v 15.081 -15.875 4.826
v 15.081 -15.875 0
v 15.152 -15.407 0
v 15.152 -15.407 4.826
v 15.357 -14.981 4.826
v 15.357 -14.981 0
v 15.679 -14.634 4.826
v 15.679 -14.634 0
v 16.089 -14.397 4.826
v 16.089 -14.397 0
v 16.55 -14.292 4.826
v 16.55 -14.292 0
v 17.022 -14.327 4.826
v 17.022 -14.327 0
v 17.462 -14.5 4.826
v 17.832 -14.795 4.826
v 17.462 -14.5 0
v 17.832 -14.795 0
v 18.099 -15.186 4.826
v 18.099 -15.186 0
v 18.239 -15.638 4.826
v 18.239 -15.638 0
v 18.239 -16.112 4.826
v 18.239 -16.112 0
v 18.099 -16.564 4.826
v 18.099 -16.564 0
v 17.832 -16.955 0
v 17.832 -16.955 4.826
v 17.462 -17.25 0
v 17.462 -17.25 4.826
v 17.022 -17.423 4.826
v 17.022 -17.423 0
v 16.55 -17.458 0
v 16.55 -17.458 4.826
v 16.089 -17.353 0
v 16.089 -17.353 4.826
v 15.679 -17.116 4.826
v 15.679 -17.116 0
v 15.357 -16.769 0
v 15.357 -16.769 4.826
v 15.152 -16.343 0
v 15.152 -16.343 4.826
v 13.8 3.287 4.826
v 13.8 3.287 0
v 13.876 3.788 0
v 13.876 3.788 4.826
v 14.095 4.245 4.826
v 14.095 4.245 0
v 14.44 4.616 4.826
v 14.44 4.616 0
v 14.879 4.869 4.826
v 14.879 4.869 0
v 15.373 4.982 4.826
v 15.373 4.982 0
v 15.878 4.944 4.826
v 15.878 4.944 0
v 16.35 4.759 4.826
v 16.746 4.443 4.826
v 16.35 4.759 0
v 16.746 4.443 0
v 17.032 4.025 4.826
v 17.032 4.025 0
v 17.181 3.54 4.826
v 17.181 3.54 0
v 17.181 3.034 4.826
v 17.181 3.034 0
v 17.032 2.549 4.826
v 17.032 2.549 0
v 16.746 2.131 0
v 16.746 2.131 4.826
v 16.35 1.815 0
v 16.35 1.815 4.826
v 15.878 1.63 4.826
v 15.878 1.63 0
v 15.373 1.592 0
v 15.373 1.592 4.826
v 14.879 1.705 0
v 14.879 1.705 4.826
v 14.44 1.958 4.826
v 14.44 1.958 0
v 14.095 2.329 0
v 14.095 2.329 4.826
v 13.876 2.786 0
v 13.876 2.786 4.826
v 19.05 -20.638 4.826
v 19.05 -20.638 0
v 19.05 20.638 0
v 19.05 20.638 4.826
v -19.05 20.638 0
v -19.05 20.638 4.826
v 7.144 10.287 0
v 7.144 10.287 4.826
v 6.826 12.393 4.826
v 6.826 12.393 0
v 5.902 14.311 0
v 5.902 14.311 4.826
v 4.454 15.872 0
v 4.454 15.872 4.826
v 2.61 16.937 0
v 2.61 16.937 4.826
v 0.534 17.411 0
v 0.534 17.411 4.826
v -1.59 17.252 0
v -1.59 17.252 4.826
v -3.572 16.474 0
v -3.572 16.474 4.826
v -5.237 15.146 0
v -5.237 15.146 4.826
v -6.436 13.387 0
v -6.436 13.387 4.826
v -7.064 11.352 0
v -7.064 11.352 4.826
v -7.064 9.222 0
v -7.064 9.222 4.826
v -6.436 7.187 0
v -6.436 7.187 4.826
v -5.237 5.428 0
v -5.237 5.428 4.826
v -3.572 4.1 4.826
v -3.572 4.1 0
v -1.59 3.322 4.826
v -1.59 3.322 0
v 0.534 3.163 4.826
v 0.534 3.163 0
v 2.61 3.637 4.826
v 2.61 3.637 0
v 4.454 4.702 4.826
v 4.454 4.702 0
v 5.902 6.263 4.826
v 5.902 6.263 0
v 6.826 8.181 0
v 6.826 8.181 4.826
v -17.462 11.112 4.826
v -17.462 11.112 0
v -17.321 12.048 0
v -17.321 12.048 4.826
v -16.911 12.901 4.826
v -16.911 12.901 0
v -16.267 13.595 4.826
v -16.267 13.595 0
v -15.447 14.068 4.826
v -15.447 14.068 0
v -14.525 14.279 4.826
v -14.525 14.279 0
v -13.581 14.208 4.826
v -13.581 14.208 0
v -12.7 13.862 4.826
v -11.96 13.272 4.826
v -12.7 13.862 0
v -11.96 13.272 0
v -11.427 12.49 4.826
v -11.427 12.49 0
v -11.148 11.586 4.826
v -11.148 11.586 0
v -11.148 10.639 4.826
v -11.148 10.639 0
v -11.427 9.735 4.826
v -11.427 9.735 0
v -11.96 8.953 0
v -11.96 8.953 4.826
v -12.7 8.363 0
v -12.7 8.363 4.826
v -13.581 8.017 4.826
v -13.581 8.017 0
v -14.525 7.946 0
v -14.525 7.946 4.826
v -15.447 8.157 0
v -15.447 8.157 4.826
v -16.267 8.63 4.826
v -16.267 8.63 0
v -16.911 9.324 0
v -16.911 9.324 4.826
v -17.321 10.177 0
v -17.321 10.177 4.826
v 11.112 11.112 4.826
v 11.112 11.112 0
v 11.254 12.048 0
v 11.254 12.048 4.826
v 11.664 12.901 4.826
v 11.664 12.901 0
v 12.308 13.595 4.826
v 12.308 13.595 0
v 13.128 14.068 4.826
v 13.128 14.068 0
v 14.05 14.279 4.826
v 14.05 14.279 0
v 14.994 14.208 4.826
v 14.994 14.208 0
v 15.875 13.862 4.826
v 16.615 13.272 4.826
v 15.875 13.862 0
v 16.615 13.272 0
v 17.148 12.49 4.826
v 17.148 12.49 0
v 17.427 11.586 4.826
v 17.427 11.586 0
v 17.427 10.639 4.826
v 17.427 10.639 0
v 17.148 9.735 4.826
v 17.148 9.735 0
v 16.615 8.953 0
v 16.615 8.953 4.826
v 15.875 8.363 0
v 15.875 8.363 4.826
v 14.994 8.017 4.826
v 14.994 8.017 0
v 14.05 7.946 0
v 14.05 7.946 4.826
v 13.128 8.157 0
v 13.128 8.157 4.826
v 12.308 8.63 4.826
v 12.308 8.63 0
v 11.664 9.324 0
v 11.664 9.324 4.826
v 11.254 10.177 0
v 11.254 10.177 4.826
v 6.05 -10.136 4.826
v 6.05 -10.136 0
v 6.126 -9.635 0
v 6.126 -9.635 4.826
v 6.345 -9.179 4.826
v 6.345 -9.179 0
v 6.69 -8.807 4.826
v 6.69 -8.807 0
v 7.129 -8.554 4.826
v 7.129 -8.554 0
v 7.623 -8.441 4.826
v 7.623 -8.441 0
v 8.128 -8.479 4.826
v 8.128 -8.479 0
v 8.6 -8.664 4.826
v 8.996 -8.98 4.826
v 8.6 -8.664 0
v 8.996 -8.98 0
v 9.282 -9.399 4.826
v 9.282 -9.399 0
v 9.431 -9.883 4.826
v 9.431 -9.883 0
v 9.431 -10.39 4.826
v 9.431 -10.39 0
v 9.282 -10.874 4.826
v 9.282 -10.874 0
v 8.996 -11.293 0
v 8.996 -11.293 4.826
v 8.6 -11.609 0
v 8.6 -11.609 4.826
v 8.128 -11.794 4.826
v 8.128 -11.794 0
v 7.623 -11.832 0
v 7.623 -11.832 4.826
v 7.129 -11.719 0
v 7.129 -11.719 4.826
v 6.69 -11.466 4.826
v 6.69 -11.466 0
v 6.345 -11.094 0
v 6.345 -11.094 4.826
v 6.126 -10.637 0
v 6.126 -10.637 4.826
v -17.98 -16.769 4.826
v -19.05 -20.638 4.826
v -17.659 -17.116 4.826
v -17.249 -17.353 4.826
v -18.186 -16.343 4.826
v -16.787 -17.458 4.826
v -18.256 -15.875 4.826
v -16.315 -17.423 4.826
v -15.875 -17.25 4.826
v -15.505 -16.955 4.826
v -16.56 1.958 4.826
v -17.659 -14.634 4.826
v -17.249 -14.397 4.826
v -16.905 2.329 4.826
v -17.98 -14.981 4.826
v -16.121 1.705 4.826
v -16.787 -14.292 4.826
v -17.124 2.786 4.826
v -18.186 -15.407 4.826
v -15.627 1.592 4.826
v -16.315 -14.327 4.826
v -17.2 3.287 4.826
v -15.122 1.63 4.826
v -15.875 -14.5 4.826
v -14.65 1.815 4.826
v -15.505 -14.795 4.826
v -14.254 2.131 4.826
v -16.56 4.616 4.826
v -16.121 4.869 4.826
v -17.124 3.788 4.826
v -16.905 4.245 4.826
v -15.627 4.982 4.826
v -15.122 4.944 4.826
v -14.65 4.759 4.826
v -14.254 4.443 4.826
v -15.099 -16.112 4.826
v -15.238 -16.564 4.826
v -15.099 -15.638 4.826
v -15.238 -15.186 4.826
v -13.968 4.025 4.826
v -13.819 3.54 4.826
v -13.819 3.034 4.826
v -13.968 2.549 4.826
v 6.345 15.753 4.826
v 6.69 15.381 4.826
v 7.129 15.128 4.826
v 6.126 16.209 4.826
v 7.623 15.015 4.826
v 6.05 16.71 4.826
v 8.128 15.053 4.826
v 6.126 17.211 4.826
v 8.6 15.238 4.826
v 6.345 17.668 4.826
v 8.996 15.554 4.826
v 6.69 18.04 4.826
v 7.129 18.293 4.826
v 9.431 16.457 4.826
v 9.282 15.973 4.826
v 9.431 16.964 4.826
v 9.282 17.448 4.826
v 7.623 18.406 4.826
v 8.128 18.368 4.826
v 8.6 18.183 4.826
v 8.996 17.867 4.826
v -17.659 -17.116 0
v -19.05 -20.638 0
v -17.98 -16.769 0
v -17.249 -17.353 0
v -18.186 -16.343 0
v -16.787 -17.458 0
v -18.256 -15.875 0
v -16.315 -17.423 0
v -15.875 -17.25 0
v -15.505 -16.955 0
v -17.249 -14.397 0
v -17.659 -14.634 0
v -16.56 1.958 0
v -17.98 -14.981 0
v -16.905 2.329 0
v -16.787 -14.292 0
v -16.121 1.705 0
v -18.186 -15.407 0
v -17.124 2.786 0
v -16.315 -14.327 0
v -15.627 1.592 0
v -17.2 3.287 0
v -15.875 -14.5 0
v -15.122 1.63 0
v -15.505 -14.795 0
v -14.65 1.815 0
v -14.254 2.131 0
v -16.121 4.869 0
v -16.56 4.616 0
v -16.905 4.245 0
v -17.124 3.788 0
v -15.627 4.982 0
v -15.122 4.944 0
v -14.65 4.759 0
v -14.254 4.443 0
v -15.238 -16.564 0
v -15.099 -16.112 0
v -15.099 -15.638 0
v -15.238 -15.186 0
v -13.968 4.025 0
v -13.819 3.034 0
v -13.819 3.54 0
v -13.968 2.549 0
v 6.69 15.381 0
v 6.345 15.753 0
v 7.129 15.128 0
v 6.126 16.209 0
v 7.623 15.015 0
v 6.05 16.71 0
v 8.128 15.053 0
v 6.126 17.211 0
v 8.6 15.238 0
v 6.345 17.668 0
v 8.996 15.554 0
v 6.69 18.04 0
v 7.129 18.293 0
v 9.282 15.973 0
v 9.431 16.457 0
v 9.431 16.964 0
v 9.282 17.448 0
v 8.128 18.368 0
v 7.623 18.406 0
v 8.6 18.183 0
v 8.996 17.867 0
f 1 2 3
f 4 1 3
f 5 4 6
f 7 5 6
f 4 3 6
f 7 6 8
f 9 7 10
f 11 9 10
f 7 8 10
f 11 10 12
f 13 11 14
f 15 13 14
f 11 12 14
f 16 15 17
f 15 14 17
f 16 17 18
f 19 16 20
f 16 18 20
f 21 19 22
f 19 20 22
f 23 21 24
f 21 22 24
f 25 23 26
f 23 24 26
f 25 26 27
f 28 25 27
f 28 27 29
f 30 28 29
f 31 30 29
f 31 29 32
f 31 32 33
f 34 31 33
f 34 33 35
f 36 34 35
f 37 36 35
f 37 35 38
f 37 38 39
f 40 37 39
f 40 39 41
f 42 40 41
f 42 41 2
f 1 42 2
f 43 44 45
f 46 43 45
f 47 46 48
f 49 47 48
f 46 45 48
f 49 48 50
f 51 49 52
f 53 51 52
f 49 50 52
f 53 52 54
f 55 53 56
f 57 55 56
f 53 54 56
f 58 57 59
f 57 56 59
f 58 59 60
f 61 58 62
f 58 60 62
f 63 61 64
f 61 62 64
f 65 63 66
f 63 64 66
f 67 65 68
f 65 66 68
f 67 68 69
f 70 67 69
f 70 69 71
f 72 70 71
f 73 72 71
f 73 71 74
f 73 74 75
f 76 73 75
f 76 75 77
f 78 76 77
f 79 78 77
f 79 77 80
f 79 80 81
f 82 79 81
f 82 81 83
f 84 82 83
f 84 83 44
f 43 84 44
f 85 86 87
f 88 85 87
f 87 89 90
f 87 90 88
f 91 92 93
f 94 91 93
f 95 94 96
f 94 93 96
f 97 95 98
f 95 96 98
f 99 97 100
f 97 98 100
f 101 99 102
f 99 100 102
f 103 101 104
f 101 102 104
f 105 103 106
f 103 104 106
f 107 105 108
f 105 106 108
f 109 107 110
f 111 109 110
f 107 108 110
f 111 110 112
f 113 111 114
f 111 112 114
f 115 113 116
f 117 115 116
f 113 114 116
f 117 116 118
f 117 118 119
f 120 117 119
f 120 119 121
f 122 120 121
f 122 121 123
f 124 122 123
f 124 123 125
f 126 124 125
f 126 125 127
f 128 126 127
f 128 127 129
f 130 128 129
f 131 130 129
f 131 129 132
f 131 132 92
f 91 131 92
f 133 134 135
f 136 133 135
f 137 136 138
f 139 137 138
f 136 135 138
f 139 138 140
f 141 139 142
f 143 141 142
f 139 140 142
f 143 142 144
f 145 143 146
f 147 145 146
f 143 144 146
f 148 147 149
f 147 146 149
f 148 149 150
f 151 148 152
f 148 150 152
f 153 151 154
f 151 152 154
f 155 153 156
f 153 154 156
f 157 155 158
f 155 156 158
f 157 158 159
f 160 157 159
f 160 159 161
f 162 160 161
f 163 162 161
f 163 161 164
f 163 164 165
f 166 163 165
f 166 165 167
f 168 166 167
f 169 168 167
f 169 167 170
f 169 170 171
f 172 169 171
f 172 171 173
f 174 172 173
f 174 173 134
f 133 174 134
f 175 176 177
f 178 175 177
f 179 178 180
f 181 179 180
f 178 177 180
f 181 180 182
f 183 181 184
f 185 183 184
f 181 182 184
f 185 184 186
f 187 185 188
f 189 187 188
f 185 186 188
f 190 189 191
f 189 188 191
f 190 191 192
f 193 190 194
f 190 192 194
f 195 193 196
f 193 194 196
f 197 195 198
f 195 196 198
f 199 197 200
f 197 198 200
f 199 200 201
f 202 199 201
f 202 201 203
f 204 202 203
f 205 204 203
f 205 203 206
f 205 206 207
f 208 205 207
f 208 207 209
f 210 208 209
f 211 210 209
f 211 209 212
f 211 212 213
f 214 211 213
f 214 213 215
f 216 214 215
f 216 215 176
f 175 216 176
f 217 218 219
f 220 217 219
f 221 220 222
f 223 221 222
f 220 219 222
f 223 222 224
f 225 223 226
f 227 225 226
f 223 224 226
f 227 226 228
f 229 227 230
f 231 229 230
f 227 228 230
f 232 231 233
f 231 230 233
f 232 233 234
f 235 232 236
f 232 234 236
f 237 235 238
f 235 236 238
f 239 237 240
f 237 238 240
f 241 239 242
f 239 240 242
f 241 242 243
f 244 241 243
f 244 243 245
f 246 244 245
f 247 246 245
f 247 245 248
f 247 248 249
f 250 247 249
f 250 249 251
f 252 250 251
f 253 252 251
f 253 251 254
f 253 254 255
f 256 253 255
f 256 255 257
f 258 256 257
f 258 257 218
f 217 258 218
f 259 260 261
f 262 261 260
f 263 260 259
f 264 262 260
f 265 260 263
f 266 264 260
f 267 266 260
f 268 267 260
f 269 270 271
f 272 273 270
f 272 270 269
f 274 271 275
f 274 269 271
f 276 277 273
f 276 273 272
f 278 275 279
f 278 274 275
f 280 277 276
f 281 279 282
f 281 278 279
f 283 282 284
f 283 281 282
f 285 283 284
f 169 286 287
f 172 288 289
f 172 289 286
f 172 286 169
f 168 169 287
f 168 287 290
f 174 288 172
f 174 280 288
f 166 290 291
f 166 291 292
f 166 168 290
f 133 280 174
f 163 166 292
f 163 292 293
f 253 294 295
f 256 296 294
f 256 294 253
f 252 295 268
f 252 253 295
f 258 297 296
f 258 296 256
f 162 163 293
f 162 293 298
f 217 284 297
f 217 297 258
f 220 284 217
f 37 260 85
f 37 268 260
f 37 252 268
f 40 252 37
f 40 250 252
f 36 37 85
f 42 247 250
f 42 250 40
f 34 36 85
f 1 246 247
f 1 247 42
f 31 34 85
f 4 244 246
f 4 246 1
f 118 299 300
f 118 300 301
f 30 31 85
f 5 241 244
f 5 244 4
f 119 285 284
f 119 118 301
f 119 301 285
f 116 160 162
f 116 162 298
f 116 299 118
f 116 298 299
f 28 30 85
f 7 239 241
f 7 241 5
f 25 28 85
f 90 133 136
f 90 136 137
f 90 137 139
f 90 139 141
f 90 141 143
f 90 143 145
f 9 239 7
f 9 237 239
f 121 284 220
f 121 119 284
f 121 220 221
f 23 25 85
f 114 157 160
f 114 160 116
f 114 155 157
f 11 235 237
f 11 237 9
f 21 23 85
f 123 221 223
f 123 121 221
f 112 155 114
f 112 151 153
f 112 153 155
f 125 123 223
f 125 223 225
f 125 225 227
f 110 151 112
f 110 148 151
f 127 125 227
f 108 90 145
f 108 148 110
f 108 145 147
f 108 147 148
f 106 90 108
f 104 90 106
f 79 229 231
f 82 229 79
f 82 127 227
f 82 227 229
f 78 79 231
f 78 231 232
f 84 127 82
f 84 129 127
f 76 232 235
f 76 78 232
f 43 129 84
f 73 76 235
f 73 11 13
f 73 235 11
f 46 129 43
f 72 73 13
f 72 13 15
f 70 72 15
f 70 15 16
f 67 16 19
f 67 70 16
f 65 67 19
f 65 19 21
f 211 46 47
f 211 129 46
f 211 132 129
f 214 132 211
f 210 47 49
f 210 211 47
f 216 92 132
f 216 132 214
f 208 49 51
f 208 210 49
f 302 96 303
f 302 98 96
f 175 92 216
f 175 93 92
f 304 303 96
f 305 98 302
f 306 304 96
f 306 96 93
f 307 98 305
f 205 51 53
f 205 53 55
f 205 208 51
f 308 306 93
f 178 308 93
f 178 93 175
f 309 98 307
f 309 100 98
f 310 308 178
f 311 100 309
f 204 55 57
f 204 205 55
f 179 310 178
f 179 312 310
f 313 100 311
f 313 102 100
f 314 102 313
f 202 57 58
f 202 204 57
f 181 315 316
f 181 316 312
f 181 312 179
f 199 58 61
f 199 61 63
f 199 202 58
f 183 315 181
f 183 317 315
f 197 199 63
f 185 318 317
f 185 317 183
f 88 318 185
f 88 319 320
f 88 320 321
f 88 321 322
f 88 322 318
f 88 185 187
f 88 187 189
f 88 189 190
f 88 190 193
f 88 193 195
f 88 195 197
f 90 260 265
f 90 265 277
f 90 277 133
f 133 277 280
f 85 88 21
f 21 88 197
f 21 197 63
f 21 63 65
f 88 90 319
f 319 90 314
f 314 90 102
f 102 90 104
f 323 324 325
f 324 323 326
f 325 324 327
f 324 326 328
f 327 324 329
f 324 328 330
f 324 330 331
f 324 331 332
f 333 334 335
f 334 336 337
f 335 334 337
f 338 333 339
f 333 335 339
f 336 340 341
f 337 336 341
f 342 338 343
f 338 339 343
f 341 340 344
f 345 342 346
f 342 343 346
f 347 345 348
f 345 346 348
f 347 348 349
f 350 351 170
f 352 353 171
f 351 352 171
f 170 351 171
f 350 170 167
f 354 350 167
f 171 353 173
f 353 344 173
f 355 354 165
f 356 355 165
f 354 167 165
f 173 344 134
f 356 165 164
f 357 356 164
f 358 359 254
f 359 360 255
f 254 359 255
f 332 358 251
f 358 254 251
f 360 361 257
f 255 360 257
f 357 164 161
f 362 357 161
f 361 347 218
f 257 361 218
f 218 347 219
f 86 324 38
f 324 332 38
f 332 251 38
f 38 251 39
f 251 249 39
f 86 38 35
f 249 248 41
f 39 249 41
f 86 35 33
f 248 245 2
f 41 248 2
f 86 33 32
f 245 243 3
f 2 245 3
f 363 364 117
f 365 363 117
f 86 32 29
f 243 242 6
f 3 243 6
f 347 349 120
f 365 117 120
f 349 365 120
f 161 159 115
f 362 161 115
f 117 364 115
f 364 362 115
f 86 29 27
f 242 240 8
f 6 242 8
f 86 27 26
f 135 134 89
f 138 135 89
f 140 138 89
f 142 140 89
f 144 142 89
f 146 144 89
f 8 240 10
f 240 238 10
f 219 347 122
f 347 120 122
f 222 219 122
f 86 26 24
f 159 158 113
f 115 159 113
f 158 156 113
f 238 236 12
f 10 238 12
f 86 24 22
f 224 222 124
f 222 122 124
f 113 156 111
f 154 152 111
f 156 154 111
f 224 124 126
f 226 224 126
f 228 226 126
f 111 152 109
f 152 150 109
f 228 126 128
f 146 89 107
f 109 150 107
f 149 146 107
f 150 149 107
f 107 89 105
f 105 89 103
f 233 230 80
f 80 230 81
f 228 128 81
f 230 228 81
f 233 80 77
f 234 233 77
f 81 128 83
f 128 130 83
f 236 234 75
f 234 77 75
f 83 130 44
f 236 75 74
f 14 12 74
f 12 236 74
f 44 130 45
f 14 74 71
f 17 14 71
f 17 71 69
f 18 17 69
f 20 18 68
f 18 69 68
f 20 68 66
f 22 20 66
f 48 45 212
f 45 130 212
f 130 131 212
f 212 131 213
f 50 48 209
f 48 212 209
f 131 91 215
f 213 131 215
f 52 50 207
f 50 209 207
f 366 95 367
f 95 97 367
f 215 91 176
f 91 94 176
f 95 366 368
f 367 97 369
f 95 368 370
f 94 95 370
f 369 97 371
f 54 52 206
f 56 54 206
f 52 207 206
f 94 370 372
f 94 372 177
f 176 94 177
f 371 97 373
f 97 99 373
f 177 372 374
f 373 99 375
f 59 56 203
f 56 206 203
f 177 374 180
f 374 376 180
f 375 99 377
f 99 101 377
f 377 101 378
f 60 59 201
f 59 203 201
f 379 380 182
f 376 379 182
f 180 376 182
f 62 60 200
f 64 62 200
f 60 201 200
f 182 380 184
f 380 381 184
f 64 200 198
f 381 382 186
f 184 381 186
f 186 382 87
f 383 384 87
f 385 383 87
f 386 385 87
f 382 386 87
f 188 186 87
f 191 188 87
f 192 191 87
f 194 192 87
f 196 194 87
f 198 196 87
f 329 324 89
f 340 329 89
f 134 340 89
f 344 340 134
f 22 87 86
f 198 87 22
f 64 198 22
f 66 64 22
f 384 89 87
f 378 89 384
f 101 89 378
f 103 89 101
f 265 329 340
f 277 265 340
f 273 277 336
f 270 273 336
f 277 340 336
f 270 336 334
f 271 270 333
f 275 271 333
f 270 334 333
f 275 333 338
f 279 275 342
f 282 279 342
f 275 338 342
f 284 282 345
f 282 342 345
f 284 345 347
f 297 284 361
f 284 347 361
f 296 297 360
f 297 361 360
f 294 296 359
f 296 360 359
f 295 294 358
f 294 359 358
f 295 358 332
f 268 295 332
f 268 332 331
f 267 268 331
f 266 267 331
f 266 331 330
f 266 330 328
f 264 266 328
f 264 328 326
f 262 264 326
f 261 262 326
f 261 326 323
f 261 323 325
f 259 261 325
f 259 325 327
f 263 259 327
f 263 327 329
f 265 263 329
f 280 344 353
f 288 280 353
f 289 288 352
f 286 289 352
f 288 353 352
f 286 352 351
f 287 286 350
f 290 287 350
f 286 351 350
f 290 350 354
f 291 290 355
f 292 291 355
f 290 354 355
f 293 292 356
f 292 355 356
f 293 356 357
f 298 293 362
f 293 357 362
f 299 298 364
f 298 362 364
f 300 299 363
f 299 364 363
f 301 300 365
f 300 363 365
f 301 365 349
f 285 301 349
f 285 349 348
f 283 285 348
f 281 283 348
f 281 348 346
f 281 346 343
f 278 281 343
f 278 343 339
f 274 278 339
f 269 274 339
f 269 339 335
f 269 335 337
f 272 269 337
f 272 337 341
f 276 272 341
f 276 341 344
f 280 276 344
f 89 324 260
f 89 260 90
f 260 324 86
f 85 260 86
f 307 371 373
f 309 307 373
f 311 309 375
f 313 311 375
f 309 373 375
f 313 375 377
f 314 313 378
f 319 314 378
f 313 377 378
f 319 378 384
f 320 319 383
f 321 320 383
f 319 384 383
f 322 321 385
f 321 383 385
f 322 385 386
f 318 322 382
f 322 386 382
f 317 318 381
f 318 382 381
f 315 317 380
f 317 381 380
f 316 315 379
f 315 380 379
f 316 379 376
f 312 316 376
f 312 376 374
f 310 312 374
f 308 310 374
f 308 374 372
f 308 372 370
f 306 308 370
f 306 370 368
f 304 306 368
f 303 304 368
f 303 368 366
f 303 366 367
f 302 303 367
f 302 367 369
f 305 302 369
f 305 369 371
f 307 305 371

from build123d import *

# Parameters (mm, degrees)
SKETCH1_W                           = 38.1
SKETCH1_H                           = 41.275
BOSS_EXTRUDE1_DEPTH                 = 4.826
SKETCH2_R                           = 7.14375
CUT_EXTRUDE1_DEPTH                  = 29.497353952
F_3_4_3_4_DIAMETER_HOLE1_D          = 3.4
F_1_4_0_25_DIAMETER_HOLE1_D         = 6.35
F_1_8_0_125_CLEARANCE_DOWEL_HOLE1_D = 3.175


with BuildPart() as part:
    # Sketch1 → Boss-Extrude1 (new body)
    with BuildSketch(Plane.XY):
        Rectangle(SKETCH1_W, SKETCH1_H)
    extrude(amount=BOSS_EXTRUDE1_DEPTH)

    # Sketch2 → Cut-Extrude1 (cut, through all)
    with BuildSketch(Plane.XY.offset(4.826)):
        with Locations((0, 10.287)):
            Circle(SKETCH2_R)
    extrude(amount=-CUT_EXTRUDE1_DEPTH, mode=Mode.SUBTRACT)

    # Ø3.4 (3.4) Diameter Hole1 (through all)
    with Locations(Plane.XY.offset(4.826)):
        with Locations((-15.5, 3.287), (7.75, 16.710393759), (15.5, 3.287), (7.75, -10.136393759)):
            Hole(F_3_4_3_4_DIAMETER_HOLE1_D / 2)

    # 1/4 (0.25) Diameter Hole1 (through all)
    with Locations(Plane.XY.offset(4.826)):
        with Locations((-14.2875, 11.1125), (14.2875, 11.1125)):
            Hole(F_1_4_0_25_DIAMETER_HOLE1_D / 2)

    # 1/8 (0.125) Clearance Dowel Hole1 (through all)
    with Locations(Plane.XY.offset(4.826)):
        with Locations((-16.66875, -15.875), (16.66875, -15.875)):
            Hole(F_1_8_0_125_CLEARANCE_DOWEL_HOLE1_D / 2)


solid = part.part
